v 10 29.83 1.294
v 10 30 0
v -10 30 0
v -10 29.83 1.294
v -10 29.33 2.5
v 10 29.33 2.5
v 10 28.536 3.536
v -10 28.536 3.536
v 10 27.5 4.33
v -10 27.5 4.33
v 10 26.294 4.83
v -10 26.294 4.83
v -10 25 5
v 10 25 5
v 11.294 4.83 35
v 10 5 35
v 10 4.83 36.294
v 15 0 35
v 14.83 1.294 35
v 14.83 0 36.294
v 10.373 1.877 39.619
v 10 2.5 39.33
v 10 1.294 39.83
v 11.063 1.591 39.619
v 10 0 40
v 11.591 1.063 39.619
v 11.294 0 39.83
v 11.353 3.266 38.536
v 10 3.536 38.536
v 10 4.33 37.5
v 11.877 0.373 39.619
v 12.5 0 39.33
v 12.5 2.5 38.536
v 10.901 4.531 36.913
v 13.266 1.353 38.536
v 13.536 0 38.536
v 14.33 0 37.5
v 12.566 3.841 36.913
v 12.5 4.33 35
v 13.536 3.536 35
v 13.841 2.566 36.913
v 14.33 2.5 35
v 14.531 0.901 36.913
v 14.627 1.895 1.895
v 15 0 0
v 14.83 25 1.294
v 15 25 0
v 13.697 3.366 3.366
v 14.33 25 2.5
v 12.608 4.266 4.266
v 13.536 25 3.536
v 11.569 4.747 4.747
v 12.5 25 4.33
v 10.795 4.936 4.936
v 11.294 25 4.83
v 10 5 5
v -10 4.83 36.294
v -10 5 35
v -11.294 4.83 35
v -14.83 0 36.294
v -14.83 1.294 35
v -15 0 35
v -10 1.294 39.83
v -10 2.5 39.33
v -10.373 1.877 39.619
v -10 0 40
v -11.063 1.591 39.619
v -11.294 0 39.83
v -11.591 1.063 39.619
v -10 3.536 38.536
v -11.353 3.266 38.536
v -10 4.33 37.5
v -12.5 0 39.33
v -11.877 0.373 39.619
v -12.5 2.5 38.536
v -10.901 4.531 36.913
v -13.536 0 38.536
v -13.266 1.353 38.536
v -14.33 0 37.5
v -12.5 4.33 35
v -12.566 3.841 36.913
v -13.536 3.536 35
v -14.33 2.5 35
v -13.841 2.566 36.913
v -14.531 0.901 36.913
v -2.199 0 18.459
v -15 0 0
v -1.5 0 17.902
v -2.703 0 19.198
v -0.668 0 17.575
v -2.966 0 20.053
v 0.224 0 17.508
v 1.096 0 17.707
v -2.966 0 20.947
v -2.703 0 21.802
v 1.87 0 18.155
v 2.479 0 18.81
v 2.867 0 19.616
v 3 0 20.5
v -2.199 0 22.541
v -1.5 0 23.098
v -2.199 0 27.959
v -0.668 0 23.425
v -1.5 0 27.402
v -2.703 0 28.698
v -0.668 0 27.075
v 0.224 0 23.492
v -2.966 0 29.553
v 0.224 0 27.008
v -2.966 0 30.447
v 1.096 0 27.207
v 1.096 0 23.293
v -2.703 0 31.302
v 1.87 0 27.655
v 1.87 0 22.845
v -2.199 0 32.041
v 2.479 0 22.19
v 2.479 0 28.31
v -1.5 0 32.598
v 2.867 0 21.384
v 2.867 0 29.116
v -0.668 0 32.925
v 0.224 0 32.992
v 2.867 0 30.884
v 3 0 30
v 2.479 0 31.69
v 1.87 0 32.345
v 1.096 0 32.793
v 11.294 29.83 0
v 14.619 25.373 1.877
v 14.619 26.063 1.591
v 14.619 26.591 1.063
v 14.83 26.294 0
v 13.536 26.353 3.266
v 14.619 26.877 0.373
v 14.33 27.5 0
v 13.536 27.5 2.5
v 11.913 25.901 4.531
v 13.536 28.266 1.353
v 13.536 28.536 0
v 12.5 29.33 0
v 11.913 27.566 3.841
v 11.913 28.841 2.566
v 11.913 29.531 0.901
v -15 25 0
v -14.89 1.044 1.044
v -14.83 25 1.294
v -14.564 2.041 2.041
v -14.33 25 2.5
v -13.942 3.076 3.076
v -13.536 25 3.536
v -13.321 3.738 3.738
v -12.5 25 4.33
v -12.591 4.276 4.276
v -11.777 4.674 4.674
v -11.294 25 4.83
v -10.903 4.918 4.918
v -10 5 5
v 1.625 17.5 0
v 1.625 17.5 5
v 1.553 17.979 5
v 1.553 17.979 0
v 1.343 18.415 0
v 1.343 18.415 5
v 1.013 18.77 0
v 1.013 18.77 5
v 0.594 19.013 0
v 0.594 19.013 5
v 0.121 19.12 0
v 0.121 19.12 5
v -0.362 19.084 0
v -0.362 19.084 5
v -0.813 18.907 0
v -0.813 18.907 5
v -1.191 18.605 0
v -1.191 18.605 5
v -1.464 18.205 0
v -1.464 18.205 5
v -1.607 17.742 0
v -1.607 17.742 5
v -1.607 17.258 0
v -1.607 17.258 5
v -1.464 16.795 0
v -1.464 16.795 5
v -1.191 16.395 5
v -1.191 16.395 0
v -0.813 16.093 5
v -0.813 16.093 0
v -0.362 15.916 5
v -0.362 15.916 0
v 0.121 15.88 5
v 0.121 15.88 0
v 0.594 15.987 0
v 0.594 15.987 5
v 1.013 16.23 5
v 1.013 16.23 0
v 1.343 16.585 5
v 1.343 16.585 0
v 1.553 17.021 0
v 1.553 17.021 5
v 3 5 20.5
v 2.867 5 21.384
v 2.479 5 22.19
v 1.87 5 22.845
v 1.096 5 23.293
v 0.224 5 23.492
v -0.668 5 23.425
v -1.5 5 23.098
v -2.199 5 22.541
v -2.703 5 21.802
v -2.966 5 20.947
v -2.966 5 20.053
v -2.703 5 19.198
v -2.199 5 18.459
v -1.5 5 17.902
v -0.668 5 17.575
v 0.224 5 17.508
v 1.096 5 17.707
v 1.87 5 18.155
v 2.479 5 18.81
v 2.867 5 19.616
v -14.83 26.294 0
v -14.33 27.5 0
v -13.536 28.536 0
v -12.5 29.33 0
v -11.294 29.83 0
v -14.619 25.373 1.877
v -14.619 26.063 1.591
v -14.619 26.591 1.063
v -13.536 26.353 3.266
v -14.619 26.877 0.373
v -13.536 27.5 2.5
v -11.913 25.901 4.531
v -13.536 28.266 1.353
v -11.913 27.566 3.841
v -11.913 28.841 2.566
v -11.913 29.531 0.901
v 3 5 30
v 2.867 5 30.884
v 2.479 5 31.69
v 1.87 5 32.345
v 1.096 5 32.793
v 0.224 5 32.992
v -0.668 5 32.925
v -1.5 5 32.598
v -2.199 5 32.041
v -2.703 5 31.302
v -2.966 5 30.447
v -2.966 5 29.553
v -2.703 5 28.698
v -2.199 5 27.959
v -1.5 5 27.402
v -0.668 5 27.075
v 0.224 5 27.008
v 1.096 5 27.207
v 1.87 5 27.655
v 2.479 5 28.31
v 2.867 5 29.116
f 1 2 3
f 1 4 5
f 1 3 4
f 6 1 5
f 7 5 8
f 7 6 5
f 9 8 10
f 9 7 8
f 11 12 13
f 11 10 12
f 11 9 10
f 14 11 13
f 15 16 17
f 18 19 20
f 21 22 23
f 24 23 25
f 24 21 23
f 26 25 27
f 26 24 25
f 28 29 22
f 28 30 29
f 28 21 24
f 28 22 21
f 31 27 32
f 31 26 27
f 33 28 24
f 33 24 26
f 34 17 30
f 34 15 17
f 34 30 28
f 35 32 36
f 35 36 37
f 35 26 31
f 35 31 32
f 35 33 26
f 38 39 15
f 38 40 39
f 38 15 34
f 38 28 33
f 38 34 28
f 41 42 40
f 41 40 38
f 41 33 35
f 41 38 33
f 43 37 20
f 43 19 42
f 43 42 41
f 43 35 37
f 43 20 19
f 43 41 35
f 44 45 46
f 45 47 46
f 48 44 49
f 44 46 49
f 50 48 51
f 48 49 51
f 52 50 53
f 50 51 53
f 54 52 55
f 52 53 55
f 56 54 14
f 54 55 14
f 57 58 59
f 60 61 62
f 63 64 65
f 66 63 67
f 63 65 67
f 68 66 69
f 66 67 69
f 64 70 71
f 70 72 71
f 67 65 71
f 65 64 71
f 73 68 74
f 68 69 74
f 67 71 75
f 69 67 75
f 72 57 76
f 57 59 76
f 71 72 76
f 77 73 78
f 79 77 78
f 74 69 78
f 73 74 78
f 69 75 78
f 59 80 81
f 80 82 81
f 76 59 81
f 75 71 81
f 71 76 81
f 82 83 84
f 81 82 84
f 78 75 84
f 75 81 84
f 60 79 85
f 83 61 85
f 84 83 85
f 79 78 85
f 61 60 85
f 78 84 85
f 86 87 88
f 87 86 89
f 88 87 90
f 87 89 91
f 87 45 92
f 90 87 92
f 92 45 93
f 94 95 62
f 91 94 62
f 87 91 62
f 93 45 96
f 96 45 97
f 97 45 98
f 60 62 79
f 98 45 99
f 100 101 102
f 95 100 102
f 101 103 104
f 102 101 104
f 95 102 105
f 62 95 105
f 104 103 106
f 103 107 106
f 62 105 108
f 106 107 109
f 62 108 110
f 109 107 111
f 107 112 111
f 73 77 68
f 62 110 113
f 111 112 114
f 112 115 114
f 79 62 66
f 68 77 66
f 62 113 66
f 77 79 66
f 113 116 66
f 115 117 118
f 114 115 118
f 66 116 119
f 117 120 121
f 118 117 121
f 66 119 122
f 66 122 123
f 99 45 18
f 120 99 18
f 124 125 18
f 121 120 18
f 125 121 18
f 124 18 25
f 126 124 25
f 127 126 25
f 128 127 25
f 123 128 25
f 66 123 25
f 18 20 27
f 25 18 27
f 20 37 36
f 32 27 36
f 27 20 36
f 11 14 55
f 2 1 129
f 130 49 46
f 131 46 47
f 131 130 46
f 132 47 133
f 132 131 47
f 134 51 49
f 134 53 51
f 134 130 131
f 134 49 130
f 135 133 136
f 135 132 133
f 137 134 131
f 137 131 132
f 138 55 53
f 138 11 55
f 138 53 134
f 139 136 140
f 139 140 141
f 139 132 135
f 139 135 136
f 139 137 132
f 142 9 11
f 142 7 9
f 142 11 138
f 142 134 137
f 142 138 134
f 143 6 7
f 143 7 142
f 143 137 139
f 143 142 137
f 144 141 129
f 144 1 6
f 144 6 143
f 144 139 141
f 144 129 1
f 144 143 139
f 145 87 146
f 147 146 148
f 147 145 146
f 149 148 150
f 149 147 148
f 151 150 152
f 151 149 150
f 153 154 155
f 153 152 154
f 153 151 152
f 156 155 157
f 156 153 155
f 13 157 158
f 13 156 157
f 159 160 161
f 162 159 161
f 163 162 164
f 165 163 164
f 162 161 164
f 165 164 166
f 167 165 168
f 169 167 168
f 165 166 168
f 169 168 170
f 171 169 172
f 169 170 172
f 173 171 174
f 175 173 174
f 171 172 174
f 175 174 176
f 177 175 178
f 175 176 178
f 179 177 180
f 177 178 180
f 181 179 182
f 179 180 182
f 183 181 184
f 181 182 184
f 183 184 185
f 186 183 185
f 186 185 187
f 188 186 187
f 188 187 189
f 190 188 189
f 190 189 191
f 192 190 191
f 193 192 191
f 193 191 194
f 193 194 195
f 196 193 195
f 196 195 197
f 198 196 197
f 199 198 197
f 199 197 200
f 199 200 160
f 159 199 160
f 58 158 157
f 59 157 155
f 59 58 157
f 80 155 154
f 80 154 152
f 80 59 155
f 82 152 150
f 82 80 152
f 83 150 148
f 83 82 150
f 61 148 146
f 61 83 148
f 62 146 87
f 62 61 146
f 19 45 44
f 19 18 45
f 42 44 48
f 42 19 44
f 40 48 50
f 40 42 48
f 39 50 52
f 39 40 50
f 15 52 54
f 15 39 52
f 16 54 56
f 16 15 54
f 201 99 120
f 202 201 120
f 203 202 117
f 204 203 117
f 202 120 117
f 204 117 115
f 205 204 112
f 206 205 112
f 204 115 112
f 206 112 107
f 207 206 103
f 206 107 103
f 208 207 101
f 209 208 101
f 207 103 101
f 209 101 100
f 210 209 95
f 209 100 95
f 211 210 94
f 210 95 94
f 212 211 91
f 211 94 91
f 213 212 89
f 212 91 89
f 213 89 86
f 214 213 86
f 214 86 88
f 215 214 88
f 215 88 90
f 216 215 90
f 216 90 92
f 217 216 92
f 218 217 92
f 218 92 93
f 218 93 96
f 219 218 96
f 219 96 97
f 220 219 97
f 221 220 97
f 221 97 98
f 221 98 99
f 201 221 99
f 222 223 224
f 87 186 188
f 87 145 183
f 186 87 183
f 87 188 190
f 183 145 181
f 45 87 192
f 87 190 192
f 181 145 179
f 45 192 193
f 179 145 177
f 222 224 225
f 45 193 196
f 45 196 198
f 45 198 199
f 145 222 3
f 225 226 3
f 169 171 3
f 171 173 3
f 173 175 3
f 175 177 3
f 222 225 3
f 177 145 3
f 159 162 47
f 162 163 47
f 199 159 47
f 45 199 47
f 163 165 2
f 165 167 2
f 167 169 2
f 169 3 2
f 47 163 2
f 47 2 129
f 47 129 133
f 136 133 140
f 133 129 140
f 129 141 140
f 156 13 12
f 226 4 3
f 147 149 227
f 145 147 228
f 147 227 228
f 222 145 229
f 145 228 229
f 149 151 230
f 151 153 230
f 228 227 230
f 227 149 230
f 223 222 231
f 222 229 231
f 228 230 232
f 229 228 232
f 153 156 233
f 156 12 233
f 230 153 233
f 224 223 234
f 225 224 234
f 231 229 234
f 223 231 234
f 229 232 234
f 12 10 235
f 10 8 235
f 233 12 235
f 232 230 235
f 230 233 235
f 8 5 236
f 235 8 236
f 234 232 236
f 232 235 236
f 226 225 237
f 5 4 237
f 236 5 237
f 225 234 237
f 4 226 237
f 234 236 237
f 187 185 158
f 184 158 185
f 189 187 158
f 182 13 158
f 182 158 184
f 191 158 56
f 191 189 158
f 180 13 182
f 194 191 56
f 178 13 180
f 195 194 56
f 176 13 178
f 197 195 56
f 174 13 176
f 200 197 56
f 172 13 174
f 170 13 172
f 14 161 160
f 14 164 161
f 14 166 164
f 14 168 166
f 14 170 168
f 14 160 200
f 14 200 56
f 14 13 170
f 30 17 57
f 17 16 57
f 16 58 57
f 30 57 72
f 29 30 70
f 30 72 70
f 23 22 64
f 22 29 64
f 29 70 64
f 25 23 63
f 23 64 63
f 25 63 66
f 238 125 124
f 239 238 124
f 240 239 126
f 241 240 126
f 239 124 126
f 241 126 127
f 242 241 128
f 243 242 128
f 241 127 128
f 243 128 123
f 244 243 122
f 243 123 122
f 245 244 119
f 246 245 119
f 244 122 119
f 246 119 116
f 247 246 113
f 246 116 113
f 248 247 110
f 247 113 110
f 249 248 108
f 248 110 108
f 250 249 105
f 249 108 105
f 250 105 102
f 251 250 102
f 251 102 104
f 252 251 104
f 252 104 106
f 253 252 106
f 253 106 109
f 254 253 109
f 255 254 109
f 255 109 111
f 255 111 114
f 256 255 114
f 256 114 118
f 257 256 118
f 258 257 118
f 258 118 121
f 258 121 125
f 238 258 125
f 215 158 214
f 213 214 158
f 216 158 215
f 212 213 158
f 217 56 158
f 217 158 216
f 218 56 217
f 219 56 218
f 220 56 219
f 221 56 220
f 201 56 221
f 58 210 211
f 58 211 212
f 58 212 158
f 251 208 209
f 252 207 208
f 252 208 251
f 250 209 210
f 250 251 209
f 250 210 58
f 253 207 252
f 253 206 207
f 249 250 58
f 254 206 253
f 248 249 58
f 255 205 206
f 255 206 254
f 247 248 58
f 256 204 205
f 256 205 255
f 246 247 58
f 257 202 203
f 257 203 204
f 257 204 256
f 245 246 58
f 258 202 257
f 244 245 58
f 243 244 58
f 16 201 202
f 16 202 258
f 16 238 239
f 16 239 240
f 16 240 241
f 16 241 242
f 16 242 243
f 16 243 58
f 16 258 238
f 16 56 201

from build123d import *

# Parameters (mm, degrees)
F0_W     = 30
F0_H     = 30
F1_DEPTH = 5
F2_W     = 5
F2_H     = 35
F3_DEPTH = 30
F4_R     = 1.625
F5_DEPTH = 25
F6_R     = 4.99999
F7_R     = 3
F8_DEPTH = 25
F9_R     = 4.99999


# Not quite as in the source:
# - a fillet or chamfer is up to 0.001 mm smaller than in the source, because OpenCascade refuses the exact size


with BuildPart() as f1:
    # F0 (on Top) → F1 (new body)
    with BuildSketch(Plane.XY):
        with Locations((0, 15)):
            Rectangle(F0_W, F0_H)
    extrude(amount=F1_DEPTH)

    # F2 (on face) → F3 (join)
    with BuildSketch(Plane.YZ.offset(15)):
        with Locations((2.5, 22.5)):
            Rectangle(F2_W, F2_H)
    extrude(amount=-F3_DEPTH)

    # F4 (on face) → F5 (cut)
    with BuildSketch(Plane.XY.offset(5)):
        with Locations((0, 17.5)):
            Circle(F4_R)
    extrude(amount=-F5_DEPTH, mode=Mode.SUBTRACT)

    # F6 (radius 5 in the source; OpenCascade refuses exactly that, so slightly less here)
    f6_edges = [f1.edges().sort_by_distance(p)[0] for p in [
        (0, 30, 5),
        (15, 17.5, 5),
        (-15, 17.5, 5),
        (15, 30, 2.5),
        (-15, 30, 2.5),
    ]]
    fillet(f6_edges, radius=F6_R)

    # F7 (on face) → F8 (cut)
    with BuildSketch(Plane.XZ):
        with Locations((0, 30)):
            Circle(F7_R)
        with Locations((0, 20.5)):
            Circle(F7_R)
    extrude(amount=-F8_DEPTH, mode=Mode.SUBTRACT)

    # F9 (radius 5 in the source; OpenCascade refuses exactly that, so slightly less here)
    f9_edges = [f1.edges().sort_by_distance(p)[0] for p in [
        (15, 5, 20.000005),
        (-15, 5, 20.000005),
        (0, 5, 40),
        (15, 2.5, 40),
        (-15, 2.5, 40),
    ]]
    fillet(f9_edges, radius=F9_R)


solid = f1.part
